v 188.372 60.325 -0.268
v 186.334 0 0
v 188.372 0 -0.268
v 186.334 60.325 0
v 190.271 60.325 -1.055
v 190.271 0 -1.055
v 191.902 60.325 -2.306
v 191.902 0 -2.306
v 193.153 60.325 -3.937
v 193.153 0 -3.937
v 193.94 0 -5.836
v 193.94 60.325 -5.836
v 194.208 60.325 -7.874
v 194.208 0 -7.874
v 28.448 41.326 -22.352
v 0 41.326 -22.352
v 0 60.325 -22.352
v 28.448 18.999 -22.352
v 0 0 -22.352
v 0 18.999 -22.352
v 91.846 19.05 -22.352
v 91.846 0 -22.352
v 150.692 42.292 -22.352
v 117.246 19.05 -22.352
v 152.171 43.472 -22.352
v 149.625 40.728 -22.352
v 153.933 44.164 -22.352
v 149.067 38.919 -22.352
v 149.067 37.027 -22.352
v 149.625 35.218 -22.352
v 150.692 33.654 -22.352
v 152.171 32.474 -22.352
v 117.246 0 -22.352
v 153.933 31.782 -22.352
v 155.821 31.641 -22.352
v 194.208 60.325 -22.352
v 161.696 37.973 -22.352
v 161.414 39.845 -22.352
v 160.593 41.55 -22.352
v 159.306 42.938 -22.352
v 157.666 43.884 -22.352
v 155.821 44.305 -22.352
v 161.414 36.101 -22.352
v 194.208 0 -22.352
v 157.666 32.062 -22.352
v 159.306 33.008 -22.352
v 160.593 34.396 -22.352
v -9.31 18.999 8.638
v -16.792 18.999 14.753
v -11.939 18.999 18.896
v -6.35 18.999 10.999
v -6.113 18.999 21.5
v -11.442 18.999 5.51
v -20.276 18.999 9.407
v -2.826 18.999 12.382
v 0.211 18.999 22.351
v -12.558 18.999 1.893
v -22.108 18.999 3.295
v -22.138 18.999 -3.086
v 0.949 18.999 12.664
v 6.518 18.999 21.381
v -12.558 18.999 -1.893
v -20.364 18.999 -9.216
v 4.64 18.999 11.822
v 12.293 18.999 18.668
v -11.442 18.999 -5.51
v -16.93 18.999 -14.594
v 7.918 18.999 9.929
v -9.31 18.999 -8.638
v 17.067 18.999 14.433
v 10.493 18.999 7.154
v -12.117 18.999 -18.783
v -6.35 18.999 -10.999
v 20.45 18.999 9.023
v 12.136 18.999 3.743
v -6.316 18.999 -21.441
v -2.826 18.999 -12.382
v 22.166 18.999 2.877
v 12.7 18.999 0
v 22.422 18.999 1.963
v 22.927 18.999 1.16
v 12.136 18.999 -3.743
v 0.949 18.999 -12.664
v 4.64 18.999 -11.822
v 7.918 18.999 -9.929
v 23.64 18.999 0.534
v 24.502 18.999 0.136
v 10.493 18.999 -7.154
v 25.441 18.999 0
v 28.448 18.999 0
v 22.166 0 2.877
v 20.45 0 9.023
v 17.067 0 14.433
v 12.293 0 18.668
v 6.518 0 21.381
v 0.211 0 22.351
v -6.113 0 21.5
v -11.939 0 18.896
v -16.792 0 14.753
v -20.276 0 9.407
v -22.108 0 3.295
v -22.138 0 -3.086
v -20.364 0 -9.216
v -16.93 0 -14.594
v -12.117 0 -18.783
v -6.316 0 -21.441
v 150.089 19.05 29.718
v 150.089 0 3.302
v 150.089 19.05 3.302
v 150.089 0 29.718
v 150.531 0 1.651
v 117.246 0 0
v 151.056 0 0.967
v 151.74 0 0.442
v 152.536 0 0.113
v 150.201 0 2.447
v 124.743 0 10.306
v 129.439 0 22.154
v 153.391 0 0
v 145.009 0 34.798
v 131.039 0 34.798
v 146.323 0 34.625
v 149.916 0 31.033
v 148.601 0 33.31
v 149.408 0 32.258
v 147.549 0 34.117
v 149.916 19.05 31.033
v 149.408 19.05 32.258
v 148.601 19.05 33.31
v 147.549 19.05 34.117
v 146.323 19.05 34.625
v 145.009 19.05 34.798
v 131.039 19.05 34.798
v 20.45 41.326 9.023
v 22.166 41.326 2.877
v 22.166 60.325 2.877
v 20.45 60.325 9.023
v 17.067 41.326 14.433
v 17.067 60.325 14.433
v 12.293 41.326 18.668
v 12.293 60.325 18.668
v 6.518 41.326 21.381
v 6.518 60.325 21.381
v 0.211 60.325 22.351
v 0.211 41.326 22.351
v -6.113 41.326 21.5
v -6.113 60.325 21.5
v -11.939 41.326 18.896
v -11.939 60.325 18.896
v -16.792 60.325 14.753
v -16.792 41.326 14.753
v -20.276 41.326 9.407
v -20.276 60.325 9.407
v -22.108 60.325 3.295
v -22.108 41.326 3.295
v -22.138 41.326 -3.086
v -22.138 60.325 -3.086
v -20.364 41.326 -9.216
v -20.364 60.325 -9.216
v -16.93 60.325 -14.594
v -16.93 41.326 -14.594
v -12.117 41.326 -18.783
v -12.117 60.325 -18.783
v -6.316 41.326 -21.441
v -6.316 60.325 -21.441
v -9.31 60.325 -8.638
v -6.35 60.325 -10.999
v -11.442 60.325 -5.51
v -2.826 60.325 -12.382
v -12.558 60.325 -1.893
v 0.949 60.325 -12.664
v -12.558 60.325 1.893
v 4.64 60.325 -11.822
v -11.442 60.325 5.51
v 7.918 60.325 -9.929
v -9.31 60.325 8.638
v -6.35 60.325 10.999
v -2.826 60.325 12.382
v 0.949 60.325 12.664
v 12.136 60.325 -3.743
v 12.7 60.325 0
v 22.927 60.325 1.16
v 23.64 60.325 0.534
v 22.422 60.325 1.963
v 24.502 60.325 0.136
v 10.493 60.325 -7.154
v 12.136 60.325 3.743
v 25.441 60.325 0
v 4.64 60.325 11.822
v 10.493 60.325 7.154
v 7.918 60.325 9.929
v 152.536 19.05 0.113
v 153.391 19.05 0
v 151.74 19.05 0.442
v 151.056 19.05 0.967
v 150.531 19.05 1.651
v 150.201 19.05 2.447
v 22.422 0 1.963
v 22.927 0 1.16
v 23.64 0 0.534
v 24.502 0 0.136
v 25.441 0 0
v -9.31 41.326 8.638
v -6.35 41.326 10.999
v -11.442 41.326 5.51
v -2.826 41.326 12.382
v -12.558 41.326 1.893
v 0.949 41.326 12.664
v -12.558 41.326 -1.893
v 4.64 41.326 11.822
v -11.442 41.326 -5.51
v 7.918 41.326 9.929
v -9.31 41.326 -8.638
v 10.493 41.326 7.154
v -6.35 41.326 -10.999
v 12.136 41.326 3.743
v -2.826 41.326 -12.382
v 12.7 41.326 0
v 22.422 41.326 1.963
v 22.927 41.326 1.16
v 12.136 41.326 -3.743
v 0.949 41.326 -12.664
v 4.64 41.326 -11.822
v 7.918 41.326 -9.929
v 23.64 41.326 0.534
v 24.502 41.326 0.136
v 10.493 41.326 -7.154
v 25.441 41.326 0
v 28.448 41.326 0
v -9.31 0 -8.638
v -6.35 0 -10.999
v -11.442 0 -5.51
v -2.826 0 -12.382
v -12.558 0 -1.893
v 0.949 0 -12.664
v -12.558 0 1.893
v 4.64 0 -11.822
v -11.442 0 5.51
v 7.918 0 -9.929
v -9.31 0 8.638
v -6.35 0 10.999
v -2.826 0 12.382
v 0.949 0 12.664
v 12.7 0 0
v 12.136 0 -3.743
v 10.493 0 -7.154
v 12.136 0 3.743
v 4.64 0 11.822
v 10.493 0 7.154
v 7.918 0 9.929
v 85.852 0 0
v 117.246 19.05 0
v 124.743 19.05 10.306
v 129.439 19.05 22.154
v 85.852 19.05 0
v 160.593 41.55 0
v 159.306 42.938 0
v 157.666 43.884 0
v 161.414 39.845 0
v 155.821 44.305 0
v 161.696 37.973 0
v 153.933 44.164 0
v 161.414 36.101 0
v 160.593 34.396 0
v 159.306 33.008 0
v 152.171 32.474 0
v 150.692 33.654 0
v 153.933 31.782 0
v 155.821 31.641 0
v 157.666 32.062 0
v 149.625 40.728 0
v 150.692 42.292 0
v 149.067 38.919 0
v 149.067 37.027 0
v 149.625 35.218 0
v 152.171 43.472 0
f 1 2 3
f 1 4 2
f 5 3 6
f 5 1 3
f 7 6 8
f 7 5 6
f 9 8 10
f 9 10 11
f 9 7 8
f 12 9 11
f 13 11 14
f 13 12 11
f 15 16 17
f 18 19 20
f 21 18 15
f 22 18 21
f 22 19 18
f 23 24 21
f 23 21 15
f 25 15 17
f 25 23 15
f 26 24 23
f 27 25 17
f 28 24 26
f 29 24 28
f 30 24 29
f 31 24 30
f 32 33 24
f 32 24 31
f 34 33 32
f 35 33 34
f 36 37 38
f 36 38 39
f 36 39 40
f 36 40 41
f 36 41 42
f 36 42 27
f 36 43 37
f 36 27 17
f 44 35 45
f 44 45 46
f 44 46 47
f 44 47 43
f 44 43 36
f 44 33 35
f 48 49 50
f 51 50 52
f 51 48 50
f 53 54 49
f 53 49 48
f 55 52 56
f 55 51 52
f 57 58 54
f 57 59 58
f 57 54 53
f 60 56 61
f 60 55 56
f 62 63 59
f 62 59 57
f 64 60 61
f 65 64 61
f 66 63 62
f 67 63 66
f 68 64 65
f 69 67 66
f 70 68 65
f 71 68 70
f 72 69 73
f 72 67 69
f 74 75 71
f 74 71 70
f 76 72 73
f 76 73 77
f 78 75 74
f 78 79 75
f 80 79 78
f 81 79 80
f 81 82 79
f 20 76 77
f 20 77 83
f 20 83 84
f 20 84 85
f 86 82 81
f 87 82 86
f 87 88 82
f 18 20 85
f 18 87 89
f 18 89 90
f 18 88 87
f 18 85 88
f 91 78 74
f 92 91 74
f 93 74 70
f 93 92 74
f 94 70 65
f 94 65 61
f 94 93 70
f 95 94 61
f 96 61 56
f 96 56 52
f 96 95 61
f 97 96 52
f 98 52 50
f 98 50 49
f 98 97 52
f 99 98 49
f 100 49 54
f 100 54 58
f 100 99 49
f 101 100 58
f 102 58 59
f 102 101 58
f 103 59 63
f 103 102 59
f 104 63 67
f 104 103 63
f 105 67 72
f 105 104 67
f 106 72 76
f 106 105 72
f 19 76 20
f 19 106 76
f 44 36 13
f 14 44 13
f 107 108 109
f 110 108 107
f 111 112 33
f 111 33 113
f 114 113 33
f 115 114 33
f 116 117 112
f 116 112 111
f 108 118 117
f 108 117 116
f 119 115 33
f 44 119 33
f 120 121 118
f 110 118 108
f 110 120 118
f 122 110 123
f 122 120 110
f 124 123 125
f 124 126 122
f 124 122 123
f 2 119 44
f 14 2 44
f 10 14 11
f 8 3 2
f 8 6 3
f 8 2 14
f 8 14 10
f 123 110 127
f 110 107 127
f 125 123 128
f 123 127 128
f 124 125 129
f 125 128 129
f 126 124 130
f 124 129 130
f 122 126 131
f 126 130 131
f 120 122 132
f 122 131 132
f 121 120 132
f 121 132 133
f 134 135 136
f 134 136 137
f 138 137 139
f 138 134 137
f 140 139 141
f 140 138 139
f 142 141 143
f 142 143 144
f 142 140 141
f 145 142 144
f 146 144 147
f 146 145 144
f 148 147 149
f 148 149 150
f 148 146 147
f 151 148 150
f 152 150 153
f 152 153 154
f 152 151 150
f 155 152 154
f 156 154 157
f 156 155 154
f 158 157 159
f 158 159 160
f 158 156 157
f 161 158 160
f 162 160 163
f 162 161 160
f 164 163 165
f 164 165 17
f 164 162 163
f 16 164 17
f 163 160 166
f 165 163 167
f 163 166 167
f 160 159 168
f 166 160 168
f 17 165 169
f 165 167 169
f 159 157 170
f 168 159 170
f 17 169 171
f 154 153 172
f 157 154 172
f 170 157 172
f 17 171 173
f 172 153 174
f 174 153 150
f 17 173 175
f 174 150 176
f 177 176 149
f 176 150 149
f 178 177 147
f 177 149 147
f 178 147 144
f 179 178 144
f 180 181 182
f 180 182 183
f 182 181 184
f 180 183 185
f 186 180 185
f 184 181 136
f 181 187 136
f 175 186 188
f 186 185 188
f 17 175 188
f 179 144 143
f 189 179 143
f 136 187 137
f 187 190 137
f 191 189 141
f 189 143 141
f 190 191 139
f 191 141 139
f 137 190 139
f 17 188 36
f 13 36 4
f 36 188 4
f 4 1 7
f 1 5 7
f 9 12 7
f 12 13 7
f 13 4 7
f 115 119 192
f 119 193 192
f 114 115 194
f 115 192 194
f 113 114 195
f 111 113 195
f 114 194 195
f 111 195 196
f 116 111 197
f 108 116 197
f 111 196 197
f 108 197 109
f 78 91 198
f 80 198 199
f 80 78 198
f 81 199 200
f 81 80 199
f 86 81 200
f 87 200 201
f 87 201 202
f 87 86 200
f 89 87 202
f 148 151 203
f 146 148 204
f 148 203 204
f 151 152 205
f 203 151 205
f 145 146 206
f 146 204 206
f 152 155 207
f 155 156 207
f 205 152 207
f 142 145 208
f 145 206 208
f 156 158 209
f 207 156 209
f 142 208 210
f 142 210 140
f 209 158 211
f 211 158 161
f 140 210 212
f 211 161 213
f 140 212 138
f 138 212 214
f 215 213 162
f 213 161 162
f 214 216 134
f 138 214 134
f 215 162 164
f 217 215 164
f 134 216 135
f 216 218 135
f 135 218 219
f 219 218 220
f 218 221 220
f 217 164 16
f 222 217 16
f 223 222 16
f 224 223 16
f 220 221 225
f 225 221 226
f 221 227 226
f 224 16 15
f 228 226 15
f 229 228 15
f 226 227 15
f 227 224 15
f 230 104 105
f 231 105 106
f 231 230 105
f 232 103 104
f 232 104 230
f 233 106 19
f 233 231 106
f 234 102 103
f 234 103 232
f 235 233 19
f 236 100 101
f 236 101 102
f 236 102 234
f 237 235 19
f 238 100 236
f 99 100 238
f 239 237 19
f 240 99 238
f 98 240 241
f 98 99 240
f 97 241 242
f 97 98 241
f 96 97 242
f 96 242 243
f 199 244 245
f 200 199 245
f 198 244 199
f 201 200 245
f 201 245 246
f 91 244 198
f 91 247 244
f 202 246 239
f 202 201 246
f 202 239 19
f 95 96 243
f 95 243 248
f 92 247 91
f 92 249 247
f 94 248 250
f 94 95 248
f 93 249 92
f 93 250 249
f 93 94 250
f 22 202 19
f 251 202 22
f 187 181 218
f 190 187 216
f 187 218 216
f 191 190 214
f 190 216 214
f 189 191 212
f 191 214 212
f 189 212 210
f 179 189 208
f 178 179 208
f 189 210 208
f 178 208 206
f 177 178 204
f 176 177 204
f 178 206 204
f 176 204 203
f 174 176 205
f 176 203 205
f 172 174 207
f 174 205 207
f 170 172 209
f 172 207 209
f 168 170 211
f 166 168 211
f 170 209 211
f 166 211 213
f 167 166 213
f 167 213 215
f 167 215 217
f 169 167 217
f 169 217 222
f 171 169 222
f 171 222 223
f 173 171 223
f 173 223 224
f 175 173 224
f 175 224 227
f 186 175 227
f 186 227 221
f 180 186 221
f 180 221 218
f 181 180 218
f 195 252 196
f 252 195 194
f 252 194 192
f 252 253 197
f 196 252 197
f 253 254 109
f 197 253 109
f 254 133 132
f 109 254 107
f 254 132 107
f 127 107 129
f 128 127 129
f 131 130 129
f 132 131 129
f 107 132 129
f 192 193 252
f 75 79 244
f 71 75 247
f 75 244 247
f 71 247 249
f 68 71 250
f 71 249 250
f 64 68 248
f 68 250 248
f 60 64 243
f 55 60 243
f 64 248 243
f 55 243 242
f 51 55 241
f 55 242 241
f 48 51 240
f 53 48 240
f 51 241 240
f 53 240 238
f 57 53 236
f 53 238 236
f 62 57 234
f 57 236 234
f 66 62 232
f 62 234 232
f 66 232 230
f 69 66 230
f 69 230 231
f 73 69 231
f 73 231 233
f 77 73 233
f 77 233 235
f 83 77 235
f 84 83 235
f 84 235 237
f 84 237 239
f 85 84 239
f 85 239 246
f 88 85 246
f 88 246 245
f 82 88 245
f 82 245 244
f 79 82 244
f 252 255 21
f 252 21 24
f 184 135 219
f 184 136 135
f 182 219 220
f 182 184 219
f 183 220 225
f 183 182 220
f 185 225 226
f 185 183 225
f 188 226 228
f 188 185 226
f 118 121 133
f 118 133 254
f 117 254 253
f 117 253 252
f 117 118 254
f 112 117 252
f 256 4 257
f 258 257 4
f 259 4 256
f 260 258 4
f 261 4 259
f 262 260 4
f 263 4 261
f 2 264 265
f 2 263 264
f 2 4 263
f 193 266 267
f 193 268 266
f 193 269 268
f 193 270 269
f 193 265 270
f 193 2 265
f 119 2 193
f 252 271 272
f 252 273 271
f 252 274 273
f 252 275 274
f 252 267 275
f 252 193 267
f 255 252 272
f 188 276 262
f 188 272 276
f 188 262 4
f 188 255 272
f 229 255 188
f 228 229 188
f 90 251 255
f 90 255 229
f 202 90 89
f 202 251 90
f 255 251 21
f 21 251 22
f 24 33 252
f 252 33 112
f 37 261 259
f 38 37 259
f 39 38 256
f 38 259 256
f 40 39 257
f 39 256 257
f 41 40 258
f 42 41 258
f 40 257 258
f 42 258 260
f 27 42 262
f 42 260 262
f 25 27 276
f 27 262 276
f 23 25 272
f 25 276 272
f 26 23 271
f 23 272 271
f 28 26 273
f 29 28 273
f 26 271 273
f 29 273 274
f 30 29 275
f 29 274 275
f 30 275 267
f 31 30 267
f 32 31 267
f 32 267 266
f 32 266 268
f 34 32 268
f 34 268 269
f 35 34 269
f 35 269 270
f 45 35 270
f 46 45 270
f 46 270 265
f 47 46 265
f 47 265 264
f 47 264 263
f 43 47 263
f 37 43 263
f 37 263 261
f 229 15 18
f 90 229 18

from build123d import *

# Parameters (mm, degrees)
F0_R      = 12.7
F1_DEPTH  = 60.325
F2_R      = 7.874
F4_DEPTH  = 19.05
F6_DEPTH  = 19.05
F7_R      = 5.08
F8_R      = 6.35
F9_DEPTH  = 22.353
F10_W     = 50.8
F10_H     = 22.3266
F11_DEPTH = 44.704
F12_R     = 3.302


with BuildPart() as f1:
    # F0 (on Front) → F1 (new body)
    with BuildSketch(Plane.XZ):
        with BuildLine():
            Line((194.2084, 0), (22.352, 0))
            ThreePointArc((22.352, 0), (15.8052507731, -15.8052507731), (0, -22.352))
            Line((0, -22.352), (194.2084, -22.352))
            Line((194.2084, -22.352), (194.2084, 0))
        make_face()
        with BuildLine():
            ThreePointArc((0, -22.352), (15.8052507731, -15.8052507731), (22.352, 0))
            ThreePointArc((22.352, 0), (-15.8052507731, 15.8052507731), (0, -22.352))
        make_face()
        Circle(F0_R, mode=Mode.SUBTRACT)
    extrude(amount=-F1_DEPTH)

    # F2
    f2_edges = [f1.edges().sort_by_distance(p)[0] for p in [
        (194.2084, 30.1625, 0),
    ]]
    fillet(f2_edges, radius=F2_R)

    # F3 (on face) → F4 (join)
    with BuildSketch(Plane.XZ):
        with BuildLine():
            ThreePointArc((131.0386, 34.798), (127.4644153616, 16.0823576341), (117.2464, 0))
            Line((117.2464, 0), (150.0886, 0))
            Line((150.0886, 0), (150.0886, 34.798))
            Line((150.0886, 34.798), (131.0386, 34.798))
        make_face()
    extrude(amount=-F4_DEPTH)

    # F5 (on face) → F6 (cut)
    with BuildSketch(Plane.XZ):
        Polygon((117.2464, -22.352), (117.2464, 0), (85.852, 0), (91.8464, -22.352), align=None)
    extrude(amount=-F6_DEPTH, mode=Mode.SUBTRACT)

    # F7
    f7_edges = [f1.edges().sort_by_distance(p)[0] for p in [
        (150.0886, 9.525, 34.798),
    ]]
    fillet(f7_edges, radius=F7_R)

    # F8 (on face) → F9 (cut, through all)
    with BuildSketch(Plane.XY):
        with Locations((155.3464, 37.973)):
            Circle(F8_R)
    extrude(amount=-F9_DEPTH, mode=Mode.SUBTRACT)

    # F10 (on face) → F11 (cut)
    with BuildSketch(Plane(origin=(0, 0, -22.352), x_dir=(1, 0, 0), z_dir=(0, 0, -1))):
        with Locations((3.048, -30.1625)):
            Rectangle(F10_W, F10_H)
    extrude(amount=-F11_DEPTH, mode=Mode.SUBTRACT)

    # F12
    f12_edges = [f1.edges().sort_by_distance(p)[0] for p in [
        (22.352, 9.4996, 0),
        (22.352, 50.8254, 0),
        (150.0886, 9.525, 0),
    ]]
    fillet(f12_edges, radius=F12_R)


solid = f1.part
